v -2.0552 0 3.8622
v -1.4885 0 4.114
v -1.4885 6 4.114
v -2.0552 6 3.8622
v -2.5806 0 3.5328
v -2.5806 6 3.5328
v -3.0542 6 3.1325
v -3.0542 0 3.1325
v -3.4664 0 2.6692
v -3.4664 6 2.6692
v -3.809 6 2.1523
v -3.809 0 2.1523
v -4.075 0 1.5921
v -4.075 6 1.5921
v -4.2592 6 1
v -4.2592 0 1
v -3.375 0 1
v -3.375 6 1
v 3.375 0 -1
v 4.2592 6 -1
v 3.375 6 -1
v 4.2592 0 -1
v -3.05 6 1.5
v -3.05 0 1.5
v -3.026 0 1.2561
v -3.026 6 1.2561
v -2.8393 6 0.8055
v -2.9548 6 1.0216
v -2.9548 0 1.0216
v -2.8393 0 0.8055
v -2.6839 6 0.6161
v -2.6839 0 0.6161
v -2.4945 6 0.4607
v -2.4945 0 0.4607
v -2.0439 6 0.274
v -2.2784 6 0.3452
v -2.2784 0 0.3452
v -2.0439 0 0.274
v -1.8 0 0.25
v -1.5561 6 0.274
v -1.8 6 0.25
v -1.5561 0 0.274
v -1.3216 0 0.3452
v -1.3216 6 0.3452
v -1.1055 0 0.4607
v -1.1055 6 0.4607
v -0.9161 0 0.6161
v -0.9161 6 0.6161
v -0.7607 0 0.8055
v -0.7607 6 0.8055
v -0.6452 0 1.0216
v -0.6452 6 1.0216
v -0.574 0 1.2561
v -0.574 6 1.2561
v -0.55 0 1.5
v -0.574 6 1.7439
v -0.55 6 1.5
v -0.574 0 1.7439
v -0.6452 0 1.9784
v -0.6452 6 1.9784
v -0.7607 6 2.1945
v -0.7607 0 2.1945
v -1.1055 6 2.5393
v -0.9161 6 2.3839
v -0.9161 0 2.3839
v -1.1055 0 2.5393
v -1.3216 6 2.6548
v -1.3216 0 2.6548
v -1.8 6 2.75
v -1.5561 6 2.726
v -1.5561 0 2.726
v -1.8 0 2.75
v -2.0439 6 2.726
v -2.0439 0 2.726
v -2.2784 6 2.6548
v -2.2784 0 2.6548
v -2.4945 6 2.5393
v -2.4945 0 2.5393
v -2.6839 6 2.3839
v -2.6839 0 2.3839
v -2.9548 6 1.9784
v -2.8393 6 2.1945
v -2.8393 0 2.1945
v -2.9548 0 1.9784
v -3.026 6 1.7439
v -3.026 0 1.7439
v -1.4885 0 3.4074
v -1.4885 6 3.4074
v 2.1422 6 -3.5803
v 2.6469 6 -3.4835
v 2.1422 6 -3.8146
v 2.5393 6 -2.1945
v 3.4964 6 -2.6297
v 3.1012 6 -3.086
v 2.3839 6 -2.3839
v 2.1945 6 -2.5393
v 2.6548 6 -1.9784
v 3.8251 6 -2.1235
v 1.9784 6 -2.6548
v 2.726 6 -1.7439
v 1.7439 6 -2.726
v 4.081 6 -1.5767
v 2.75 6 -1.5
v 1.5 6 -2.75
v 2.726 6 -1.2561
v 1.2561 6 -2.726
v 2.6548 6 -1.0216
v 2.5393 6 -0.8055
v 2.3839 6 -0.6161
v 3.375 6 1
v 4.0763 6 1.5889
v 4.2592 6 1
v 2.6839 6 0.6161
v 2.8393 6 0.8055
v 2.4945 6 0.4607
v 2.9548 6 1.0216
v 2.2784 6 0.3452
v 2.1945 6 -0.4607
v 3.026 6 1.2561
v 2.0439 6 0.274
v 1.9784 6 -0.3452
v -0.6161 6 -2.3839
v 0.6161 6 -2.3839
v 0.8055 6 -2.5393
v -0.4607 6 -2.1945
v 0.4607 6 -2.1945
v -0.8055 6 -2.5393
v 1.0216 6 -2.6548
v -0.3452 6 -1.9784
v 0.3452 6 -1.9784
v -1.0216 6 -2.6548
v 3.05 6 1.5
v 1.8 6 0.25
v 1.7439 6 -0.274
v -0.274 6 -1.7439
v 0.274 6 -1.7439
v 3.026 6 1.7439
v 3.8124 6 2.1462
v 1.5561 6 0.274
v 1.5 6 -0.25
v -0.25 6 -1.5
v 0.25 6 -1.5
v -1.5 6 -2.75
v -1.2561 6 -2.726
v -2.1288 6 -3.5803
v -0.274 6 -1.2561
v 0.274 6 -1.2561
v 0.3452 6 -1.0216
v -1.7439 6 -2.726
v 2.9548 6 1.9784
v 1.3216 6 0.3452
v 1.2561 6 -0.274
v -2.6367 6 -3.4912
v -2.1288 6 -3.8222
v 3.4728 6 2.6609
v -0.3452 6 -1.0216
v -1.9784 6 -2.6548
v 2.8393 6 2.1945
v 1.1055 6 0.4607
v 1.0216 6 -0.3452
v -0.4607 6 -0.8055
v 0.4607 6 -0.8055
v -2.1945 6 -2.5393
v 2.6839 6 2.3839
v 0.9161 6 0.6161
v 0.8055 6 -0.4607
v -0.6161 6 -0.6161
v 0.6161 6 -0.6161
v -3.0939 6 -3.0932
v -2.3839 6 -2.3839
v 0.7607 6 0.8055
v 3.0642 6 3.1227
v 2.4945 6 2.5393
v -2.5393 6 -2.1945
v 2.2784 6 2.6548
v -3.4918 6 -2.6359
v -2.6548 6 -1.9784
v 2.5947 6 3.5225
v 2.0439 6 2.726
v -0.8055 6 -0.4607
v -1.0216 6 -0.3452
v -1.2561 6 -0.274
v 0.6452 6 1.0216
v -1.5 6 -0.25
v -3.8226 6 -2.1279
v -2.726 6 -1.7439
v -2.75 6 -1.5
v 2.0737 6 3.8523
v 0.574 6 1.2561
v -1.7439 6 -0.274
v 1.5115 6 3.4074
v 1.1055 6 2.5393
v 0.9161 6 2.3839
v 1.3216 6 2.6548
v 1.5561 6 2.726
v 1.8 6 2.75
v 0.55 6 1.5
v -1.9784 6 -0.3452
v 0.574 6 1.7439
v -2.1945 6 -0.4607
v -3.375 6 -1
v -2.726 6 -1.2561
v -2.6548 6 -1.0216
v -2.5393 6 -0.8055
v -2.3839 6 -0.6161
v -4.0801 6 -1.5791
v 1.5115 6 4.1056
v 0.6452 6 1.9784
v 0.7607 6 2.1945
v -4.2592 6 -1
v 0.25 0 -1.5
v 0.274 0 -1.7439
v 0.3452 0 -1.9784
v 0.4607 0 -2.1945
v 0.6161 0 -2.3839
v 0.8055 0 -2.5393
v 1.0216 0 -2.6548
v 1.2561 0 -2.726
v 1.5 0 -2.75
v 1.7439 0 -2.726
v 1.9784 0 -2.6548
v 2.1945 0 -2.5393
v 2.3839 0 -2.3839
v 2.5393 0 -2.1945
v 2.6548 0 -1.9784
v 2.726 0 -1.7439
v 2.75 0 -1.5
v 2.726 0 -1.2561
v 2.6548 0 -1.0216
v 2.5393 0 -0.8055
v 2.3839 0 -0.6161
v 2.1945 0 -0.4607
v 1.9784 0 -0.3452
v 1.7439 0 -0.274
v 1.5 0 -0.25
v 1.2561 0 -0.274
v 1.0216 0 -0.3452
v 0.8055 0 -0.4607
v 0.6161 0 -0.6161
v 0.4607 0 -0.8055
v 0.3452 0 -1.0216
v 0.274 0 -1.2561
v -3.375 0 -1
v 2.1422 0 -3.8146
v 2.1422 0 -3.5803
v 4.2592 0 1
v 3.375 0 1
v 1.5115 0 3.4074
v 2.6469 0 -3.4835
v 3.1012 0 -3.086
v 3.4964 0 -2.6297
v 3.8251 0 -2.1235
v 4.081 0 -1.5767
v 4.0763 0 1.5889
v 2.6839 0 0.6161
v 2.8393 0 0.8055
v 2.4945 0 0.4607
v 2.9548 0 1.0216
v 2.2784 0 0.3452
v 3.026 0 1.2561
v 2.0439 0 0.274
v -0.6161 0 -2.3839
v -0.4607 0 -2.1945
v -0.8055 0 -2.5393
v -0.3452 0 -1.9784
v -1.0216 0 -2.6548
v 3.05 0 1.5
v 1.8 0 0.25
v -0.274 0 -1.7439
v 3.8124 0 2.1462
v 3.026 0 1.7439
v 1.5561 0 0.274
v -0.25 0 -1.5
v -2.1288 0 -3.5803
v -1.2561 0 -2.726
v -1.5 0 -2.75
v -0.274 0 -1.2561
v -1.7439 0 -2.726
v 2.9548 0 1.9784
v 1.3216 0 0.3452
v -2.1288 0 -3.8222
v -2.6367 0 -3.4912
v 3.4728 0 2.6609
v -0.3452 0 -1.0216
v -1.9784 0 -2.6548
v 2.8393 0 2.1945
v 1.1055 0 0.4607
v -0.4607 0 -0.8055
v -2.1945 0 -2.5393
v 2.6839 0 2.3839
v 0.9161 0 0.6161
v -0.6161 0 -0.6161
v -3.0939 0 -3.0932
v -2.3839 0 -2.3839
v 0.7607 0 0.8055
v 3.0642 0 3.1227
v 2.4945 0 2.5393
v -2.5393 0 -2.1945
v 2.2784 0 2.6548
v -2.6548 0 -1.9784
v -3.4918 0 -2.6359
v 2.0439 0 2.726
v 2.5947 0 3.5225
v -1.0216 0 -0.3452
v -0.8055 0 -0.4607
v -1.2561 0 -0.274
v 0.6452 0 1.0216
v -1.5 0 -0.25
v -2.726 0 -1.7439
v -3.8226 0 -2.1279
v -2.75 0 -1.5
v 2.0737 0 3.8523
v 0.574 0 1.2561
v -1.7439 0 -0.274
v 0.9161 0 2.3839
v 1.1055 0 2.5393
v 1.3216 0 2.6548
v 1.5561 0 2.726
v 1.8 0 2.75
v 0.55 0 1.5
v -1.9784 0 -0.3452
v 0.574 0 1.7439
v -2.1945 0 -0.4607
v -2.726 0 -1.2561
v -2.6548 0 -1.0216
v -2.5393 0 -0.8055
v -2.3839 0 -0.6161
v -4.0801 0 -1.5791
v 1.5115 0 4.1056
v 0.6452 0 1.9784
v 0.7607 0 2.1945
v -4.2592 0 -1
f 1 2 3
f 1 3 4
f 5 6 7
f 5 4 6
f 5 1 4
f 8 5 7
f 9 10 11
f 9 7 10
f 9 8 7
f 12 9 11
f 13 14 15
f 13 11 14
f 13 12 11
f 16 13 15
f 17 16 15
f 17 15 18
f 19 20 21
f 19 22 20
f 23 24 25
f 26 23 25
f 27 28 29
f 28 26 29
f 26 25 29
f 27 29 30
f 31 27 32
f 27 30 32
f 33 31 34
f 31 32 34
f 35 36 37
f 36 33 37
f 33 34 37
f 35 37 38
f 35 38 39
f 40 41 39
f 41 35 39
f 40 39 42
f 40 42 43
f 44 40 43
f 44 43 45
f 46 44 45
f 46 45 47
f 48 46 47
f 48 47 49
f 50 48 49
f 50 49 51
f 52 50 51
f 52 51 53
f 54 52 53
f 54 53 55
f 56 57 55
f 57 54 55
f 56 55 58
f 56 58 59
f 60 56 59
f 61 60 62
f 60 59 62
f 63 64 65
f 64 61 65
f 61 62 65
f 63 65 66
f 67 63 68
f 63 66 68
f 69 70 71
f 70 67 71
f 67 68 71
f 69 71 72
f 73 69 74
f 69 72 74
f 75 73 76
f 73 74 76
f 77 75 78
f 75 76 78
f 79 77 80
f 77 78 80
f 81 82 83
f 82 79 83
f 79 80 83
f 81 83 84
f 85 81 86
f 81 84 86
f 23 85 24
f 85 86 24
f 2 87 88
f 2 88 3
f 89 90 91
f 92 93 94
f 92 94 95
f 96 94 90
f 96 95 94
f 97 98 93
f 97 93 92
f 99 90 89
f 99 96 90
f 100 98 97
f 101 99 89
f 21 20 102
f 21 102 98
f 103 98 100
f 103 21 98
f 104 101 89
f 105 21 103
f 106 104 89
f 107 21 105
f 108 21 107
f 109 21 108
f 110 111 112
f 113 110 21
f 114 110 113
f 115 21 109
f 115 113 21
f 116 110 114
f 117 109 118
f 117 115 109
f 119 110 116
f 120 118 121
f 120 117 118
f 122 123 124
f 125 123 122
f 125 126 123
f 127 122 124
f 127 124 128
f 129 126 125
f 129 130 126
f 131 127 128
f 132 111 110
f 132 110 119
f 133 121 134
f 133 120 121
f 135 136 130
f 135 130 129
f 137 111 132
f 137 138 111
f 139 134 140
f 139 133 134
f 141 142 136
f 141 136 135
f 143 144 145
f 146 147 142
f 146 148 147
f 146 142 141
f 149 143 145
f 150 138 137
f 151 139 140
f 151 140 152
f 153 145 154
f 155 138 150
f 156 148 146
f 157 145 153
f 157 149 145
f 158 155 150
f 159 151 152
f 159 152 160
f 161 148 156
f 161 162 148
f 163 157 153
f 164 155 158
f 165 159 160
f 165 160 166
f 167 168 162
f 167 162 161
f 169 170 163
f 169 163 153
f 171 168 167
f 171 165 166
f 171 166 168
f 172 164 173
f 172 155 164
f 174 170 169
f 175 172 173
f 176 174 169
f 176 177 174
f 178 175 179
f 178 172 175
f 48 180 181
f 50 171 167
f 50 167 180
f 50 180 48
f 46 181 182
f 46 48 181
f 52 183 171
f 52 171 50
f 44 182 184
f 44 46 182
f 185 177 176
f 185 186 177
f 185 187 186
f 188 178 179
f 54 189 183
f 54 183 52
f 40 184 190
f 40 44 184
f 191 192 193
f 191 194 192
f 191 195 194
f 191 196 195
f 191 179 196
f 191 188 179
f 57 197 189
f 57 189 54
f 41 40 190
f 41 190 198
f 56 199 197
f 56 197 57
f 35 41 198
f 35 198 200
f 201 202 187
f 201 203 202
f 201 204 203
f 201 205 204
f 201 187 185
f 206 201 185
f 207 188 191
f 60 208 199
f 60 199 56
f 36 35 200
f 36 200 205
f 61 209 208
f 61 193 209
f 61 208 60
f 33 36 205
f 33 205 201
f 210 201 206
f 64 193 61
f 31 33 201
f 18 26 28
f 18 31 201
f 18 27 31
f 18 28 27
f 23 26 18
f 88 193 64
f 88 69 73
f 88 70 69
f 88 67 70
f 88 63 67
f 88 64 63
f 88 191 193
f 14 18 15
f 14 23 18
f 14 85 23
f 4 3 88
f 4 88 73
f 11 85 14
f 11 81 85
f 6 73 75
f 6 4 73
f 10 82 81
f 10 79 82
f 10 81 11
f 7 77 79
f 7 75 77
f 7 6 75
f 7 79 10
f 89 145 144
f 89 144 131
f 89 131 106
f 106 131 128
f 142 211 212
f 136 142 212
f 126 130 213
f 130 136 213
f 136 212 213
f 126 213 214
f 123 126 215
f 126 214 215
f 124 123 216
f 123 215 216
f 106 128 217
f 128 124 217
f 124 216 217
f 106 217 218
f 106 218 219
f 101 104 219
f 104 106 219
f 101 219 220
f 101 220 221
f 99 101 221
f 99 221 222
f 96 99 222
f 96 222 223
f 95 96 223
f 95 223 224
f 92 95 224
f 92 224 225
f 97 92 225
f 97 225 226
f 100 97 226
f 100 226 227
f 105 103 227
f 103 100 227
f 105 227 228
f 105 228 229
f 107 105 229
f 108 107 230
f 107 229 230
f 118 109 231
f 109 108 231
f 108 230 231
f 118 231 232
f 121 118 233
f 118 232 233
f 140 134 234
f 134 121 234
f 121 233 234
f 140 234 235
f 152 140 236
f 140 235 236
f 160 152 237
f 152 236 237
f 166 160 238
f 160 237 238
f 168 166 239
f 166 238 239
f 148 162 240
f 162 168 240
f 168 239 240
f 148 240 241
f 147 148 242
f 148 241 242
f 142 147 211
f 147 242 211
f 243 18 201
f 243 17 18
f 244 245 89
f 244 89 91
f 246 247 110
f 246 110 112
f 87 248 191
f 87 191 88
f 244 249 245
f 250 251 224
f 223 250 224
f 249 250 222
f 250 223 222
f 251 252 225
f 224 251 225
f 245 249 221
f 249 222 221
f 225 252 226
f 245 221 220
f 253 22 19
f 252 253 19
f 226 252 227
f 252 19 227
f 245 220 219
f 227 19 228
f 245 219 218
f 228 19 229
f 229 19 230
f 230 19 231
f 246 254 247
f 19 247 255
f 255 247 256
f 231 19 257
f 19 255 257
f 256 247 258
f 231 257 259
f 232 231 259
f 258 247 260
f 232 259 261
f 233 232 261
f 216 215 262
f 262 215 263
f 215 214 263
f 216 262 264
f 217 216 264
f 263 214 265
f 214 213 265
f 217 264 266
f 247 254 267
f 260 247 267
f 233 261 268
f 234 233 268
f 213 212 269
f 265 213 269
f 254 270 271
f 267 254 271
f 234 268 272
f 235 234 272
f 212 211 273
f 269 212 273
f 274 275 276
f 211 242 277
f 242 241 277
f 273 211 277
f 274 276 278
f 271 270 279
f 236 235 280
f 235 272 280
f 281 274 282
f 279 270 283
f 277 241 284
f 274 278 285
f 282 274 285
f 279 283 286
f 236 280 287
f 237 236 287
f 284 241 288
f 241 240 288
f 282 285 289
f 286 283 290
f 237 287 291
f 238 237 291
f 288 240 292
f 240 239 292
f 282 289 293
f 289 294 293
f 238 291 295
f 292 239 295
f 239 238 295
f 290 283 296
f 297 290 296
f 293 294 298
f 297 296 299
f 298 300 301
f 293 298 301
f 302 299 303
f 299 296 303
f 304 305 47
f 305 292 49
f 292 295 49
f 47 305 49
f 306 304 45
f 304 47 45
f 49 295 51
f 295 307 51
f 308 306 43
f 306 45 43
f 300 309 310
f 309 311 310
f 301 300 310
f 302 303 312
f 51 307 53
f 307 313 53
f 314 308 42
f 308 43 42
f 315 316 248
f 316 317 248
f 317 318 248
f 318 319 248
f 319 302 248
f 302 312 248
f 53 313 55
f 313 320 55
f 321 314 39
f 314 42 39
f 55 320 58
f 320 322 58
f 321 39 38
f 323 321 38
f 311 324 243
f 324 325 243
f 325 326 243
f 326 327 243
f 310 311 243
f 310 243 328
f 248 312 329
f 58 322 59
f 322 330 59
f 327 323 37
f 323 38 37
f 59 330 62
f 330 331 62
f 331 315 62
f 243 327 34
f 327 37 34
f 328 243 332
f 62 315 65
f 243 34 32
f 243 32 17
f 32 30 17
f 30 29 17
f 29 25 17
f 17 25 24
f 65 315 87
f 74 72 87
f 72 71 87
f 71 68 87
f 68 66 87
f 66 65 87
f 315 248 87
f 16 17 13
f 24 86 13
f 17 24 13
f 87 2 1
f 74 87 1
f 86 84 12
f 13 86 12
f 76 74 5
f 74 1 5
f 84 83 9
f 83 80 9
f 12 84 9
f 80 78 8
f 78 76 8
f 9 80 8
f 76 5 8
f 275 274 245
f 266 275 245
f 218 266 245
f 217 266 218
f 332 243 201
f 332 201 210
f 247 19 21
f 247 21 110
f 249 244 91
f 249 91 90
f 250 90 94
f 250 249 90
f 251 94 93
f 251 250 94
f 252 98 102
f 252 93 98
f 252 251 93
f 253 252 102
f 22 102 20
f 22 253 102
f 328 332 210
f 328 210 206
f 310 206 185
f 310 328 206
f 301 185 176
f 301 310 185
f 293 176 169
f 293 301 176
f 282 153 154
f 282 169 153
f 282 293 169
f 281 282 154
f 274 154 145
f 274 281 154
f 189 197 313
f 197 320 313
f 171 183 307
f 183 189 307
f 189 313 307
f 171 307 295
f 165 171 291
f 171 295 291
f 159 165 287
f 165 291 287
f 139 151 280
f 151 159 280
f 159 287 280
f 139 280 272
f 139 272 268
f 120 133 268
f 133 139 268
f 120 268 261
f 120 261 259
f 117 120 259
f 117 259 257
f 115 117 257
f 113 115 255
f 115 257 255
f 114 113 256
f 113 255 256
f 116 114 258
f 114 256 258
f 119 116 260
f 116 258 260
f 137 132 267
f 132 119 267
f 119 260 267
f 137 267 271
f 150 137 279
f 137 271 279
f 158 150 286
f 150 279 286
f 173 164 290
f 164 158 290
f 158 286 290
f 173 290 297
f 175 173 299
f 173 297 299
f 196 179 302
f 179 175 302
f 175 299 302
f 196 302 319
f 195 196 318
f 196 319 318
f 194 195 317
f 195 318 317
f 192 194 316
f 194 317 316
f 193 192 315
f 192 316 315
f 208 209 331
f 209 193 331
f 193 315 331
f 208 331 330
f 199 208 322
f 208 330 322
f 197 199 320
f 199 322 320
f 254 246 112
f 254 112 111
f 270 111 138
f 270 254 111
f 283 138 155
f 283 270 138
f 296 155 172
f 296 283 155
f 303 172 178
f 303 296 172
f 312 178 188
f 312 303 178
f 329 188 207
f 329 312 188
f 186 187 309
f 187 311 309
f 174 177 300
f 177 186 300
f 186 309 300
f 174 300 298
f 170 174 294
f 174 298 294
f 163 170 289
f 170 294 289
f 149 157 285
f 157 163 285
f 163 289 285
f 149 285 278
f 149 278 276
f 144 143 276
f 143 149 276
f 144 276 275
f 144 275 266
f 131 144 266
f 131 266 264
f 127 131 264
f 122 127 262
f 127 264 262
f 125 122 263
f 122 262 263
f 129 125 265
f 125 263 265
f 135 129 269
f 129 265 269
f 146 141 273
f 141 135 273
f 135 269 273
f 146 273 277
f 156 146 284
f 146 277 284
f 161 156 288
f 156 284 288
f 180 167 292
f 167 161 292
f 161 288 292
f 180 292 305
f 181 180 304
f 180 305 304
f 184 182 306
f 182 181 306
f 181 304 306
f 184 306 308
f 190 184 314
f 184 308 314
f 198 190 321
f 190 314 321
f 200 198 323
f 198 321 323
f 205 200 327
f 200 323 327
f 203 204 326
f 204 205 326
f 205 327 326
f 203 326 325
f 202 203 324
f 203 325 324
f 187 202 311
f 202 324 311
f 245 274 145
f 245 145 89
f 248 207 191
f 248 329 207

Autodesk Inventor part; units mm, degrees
ref_plane "YZ Plane" through (0, 0, 0) normal (1, 0, 0) x (0, 1, 0)
ref_plane "XZ Plane" through (0, 0, 0) normal (0, 1, 0) x (-1, 0, 0)
ref_plane "XY Plane" through (0, 0, 0) normal (0, 0, 1) x (1, 0, 0)
sketch "Sketch1" plane through (0, 0, 0) normal (0, 1, 0) x (-1, 0, 0)
  circle A0 centre (0, 0) radius 4.375
  circle A1 centre (1.8, 1.5) radius 1.25
  circle A2 centre (1.5, -1.5) radius 1.25
  circle A3 centre (-1.8, 1.5) radius 1.25
  circle A4 centre (-1.5, -1.5) radius 1.25
  line L0 (1.4885, 4.7346) -> (0.1984, 4.7346)
  line L1 (-1.5115, 4.1056) -> (-1.5115, 3.4074)
  line L2 (-1.5115, 3.4074) -> (1.4885, 3.4074)
  line L3 (1.4885, 3.4074) -> (1.4885, 4.7346)
  line L4 (1.4885, 4.7346) -> (-1.5115, 3.4074) construction
  line L5 (0.1984, 4.7346) -> (1.4885, 3.4074) construction
  line L6 (2.1288, -3.5803) -> (-2.1422, -3.5803)
  line L7 (-2.1422, -3.5803) -> (-2.1422, -3.8146)
  line L8 (-2.1708, -5.1794) -> (2.1288, -5.1794)
  line L9 (2.1288, -5.1794) -> (2.1288, -3.5803)
  line L10 (4.2592, 1) -> (3.375, 1)
  line L11 (3.375, 1) -> (3.375, -1)
  line L12 (3.375, -1) -> (5.375, -1)
  line L13 (5.375, -1) -> (5.375, 1)
  line L14 (5.375, 1) -> (3.375, -1) construction
  line L15 (3.375, 1) -> (5.375, -1) construction
  line L16 (-3.375, 1) -> (-4.2592, 1)
  line L17 (-5.375, 1) -> (-5.375, -1)
  line L18 (-5.375, -1) -> (-3.375, -1)
  line L19 (-3.375, -1) -> (-3.375, 1)
  line L20 (-3.375, 1) -> (-5.375, -1) construction
  line L21 (-5.375, 1) -> (-3.375, -1) construction
  point P0 (0.5864, 4.3355)
  point P1 (0.2908, -4.3653)
  point P2 (1.4885, 4.114)
  point P3 (2.1288, -3.8221)
  point P4 (4.375, 0)
  point P5 (-4.375, 0)
  point P6 (-4.2592, -1)
  point P7 (4.2592, -1)
  dimension "d0" = 8.75
  dimension "d1" = 2.5
  dimension "d_1" = 2.5
  dimension "d3" = 2.5
  dimension "d4" = 2.5
  dimension "d5" = 1.5
  dimension "d6" = 1.5
  dimension "d7" = 1.5
  dimension "d8" = 1.5
  dimension "d9" = 1.8
  dimension "d10" = 1.8
  dimension "d11" = 1.5
  dimension "d12" = 1.5
  dimension "d13" = 3
  dimension "d19" = 2
  dimension "d20" = 2
  dimension "d21" = 2
  dimension "d22" = 2
extrude "Extrusion1" add sketch "Sketch1" along normal blind 6 contours L10 L11 L12 A0 L9 L6 L7 L18 L19 L16 L1 L2 L3
sketch "Sketch2" plane through (0, 0, 0) normal (0, -1, 0) x (1, 0, 0)
  circle A0 centre (1.5, -1.5) radius 1.25 projected
  circle A1 centre (1.8, 1.5) radius 1.25 projected
  circle A2 centre (-1.5, -1.5) radius 1.25 projected
  circle A3 centre (-1.8, 1.5) radius 1.25 projected
  line L0 (1.5115, 3.4074) -> (1.5115, 4.1056) projected
  line L1 (-1.4885, 3.4074) -> (1.5115, 3.4074) projected
  line L2 (-1.4885, 4.114) -> (-1.4885, 3.4074) projected
  arc A4 (-1.4885, 4.114) -> (-4.2592, 1) centre (0, 0) ccw projected
  line L3 (-3.375, 1) -> (-4.2592, 1) projected
  line L4 (-3.375, -1) -> (-3.375, 1) projected
  line L5 (-4.2592, -1) -> (-3.375, -1) projected
  arc A5 (-4.2592, -1) -> (-2.1288, -3.8221) centre (0, 0) ccw projected
  line L6 (-2.1288, -3.5803) -> (-2.1288, -3.8221) projected
  line L7 (2.1422, -3.5803) -> (-2.1288, -3.5803) projected
  line L8 (2.1422, -3.8146) -> (2.1422, -3.5803) projected
  arc A6 (2.1422, -3.8146) -> (4.2592, -1) centre (0, 0) ccw projected
  line L9 (3.375, -1) -> (4.2592, -1) projected
  line L10 (3.375, 1) -> (3.375, -1) projected
  line L11 (4.2592, 1) -> (3.375, 1) projected
  arc A7 (4.2592, 1) -> (1.5115, 4.1056) centre (0, 0) ccw projected
  circle A8 centre (0, 0) radius 5.9296
equation "\"d1\" = d_1"
equation "\"d3\" = d_1"
equation "\"d4\" = d_1"
properties part number "00_Kycon_4pin_mail"
